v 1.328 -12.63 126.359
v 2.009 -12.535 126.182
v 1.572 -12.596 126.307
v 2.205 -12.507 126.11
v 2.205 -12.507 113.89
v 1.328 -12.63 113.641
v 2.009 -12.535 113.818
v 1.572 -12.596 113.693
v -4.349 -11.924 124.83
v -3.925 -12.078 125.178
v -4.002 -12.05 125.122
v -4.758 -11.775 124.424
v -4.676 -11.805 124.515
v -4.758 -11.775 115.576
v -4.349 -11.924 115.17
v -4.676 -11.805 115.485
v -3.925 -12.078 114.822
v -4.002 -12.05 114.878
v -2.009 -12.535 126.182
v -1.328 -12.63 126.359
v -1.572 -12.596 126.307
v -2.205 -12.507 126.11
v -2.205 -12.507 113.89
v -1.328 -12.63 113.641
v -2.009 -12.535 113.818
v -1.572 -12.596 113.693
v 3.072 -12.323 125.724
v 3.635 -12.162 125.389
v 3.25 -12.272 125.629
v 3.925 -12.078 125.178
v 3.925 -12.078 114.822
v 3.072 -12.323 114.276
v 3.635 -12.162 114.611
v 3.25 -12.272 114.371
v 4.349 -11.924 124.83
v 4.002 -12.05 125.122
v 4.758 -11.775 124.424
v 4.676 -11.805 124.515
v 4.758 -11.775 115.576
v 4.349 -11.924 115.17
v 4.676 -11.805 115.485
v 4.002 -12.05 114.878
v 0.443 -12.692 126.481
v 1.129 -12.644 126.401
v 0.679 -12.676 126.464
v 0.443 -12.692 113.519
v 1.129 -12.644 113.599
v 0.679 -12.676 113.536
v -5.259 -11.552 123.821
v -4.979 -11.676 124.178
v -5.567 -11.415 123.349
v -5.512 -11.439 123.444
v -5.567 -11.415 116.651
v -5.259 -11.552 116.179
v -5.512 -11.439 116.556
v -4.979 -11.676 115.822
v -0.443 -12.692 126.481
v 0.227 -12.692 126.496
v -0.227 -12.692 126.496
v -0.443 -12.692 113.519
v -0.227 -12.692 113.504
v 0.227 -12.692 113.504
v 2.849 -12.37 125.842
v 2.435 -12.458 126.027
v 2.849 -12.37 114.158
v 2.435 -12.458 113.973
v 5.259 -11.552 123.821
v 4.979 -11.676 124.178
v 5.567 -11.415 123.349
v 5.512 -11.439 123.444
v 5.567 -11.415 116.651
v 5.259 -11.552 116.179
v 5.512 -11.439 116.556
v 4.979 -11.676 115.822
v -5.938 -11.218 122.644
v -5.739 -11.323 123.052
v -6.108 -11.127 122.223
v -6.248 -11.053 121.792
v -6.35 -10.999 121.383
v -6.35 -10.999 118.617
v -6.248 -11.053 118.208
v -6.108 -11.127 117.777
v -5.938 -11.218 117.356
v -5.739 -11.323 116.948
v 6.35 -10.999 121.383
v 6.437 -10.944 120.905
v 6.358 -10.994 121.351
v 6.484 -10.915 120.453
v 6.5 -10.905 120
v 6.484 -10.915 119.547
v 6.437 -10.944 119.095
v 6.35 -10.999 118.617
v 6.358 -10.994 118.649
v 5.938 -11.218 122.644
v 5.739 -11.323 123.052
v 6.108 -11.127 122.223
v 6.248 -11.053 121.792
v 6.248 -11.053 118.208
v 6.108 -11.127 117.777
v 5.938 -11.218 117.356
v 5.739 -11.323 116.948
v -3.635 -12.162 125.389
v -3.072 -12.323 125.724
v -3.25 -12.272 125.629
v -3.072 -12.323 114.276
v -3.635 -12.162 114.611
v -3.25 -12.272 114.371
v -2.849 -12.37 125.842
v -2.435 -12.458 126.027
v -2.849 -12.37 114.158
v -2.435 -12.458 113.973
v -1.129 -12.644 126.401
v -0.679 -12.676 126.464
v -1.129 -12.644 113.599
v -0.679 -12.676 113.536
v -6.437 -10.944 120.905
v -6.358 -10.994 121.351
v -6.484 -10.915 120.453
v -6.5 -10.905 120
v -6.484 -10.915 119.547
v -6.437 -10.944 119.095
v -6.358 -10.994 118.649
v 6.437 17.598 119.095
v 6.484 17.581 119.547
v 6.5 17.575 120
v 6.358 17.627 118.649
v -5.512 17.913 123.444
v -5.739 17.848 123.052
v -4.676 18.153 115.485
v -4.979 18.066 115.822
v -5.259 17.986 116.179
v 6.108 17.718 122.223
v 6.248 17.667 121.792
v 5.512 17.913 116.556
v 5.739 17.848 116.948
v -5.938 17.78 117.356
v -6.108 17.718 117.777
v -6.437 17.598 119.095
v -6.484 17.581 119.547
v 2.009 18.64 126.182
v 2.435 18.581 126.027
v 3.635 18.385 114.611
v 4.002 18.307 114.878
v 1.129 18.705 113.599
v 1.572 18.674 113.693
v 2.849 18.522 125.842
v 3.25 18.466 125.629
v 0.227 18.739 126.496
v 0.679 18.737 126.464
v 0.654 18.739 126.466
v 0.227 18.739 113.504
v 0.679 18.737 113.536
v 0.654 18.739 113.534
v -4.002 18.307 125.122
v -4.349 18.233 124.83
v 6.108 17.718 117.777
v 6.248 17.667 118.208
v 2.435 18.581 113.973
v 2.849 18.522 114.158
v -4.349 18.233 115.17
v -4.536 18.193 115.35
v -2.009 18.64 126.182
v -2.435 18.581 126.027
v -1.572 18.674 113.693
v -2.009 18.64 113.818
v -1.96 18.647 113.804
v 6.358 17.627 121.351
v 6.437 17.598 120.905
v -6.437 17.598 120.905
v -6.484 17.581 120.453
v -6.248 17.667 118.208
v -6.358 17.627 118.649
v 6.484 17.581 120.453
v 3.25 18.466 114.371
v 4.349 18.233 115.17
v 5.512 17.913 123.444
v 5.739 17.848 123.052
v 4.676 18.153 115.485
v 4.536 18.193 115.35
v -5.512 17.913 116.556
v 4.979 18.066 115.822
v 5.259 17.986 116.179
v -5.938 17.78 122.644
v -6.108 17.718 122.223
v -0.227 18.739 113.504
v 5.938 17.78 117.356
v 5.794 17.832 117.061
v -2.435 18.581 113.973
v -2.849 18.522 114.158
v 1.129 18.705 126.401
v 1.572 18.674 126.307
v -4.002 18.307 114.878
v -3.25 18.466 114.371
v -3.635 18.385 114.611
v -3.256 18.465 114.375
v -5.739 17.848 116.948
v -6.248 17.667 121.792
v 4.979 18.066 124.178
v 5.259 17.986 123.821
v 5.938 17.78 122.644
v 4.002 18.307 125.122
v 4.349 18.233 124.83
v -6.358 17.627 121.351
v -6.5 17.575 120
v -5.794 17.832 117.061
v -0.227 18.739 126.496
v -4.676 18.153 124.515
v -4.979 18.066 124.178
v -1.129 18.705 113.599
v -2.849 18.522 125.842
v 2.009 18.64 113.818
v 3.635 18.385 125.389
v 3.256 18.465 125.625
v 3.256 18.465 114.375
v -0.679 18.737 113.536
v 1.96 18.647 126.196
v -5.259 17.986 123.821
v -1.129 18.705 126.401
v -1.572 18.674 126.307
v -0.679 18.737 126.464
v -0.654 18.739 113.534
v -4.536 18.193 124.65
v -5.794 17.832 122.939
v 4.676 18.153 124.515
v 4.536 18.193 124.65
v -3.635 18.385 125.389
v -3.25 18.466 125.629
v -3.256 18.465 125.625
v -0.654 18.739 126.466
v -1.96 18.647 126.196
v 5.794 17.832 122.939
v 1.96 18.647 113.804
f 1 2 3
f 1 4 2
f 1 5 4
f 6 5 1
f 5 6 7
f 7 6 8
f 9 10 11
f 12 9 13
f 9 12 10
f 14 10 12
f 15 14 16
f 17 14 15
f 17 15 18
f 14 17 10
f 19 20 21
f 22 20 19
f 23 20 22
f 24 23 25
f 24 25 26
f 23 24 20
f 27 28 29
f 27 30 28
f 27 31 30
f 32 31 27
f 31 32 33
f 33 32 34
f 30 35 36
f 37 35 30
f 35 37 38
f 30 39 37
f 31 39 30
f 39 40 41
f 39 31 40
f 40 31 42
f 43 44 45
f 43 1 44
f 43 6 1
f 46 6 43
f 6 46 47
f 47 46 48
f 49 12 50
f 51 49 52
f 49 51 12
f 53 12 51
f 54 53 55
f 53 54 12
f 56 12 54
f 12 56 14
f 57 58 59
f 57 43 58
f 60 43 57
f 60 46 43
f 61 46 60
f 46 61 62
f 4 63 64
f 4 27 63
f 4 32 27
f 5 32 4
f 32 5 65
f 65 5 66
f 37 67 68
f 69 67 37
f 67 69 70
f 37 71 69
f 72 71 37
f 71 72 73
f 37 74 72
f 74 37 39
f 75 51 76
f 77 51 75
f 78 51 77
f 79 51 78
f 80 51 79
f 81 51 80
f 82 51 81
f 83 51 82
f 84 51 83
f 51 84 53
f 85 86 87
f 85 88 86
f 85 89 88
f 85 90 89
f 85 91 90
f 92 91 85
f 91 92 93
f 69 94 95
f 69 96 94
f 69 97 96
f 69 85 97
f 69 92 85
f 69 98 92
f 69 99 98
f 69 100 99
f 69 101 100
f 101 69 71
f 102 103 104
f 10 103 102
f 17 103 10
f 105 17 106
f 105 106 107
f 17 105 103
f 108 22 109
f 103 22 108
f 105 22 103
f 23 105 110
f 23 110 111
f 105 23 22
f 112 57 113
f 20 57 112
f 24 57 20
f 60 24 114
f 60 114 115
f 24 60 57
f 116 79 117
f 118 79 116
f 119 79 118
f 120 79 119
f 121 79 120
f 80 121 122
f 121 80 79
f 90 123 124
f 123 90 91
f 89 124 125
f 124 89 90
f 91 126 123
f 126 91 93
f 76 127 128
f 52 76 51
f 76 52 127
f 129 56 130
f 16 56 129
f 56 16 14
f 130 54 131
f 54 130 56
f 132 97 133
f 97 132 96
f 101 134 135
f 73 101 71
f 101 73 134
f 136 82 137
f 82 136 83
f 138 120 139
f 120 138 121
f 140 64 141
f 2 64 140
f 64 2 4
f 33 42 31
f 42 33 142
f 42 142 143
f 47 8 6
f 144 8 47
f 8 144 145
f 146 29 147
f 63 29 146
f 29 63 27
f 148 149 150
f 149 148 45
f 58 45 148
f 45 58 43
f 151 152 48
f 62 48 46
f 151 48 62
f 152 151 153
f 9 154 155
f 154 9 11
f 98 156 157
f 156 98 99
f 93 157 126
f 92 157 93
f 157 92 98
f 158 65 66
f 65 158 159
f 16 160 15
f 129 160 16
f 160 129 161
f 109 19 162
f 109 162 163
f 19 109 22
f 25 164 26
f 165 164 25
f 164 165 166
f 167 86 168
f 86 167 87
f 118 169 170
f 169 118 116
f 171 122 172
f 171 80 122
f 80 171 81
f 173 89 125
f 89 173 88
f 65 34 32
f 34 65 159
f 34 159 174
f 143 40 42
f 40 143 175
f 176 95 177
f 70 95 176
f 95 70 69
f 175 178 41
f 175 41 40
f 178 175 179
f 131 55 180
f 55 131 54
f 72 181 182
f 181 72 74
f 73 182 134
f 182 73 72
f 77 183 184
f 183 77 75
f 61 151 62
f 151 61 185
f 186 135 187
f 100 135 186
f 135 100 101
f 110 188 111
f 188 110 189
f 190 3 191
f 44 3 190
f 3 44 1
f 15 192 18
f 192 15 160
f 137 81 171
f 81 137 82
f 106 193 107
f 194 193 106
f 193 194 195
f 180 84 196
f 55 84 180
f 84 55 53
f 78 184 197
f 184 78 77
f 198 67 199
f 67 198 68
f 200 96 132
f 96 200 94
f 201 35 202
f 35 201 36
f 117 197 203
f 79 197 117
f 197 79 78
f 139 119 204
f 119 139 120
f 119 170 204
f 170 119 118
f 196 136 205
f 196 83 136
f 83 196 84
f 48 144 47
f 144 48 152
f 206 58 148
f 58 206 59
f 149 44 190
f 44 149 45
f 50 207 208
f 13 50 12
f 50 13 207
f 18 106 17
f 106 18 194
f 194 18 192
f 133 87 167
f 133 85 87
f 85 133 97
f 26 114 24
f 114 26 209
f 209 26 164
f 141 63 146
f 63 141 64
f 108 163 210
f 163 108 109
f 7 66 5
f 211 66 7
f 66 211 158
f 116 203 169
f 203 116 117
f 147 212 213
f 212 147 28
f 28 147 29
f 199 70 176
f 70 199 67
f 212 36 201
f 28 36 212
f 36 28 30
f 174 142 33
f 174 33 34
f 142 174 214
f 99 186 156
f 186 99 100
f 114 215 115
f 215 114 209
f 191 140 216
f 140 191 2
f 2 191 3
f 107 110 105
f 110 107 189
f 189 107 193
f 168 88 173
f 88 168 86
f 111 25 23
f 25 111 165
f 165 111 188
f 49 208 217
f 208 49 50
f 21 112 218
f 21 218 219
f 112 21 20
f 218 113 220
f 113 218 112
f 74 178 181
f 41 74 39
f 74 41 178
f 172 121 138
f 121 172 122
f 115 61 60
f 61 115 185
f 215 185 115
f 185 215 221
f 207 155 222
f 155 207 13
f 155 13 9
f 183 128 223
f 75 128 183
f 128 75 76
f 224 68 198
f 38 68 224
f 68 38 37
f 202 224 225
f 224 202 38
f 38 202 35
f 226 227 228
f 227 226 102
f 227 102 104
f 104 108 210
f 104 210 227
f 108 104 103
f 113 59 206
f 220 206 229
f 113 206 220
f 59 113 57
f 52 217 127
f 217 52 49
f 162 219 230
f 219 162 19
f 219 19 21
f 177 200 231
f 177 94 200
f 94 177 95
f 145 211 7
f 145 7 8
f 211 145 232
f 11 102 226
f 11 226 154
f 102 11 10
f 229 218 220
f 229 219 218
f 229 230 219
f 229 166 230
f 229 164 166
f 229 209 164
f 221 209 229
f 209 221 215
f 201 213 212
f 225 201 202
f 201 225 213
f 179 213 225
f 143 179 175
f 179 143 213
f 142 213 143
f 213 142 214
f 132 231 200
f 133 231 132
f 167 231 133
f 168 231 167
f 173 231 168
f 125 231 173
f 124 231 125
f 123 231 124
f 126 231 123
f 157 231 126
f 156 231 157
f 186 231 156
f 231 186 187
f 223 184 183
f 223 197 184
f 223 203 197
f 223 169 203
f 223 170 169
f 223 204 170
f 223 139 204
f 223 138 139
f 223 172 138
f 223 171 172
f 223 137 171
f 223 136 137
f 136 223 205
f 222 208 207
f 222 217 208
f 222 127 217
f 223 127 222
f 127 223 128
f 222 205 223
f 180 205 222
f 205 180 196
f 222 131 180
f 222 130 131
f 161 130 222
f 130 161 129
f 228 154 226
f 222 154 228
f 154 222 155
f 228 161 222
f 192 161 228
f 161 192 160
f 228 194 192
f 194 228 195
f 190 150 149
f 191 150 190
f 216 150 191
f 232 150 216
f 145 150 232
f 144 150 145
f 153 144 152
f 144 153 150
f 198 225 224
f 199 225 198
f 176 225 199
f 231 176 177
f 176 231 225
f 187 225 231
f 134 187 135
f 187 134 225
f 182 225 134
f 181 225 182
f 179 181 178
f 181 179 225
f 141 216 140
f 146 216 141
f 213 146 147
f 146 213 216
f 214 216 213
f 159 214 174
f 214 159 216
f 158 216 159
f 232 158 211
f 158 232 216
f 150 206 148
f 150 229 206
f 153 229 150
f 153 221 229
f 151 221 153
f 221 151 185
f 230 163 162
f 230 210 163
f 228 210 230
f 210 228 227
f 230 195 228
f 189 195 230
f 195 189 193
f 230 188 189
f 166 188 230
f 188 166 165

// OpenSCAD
// file: dim.scad
TANO_VERSION		= 2;

M_TRANSITION		= 101;
M_LED_HOLDER_FRONT	= M_TRANSITION + 62;
M_LED_HOLDER_BACK	= M_LED_HOLDER_FRONT - 10;
M_SWITCH_CENTER		= M_TRANSITION + 45;
M_DOTSTAR			= M_TRANSITION + 33;	// FIXME center mark of first dotstar
M_PORT_CENTER       = M_TRANSITION + 14;

M_POMMEL_BACK		= -12.5;	// Back of the pommel
M_0					= 0;
M_POMMEL_FRONT		= 10;		// Where the pommel becomes aft
M_RAIL_START		= 12;
M_SPKR_RING			= 15.5;		// Front of the speaker ring.

H_BUTTRESS			= 4;

M_BUTTRESS_0		= M_SPKR_RING;			// speaker holder, behind wings
M_BUTTRESS_1		= M_SPKR_RING + 18;
M_BUTTRESS_2		= M_SPKR_RING + 37;
M_BUTTRESS_3		= M_BUTTRESS_0 + H_BUTTRESS + 55;
M_BUTTRESS_4		= M_SPKR_RING + 70;		// holds speaker in place, space for foam

M_WAY_BACK			= -20;
H_FAR				= 200;

MM_TO_INCHES = 1 / 25.4;
INCHES_TO_MM = 25.4;

D_FORWARD			= 25.4;
R_FORWARD 			= D_FORWARD / 2;
D_AFT				= 32.5;
R_AFT 				= D_AFT / 2;
T_TRANSITION_RING	= 4;

Y_SWITCH			= 9.6;
D_SWITCH			= 12.5;
D_SWITCH_TOP		= 14.5;
D_PORT 				= 12.7;		// FIXME
D_SMALL_PORT		= 7.9;

D_SABER_OUTER		= 37.5;

X_DOTSTAR           = 5.0;  // from spec
Y_DOTSTAR           = 1.4;  // from spec
DOTSTAR_SPACE		= 7;

H_BATTERY           = 68;
D_BATTERY           = 18.50 + 0.5;    // An 1850. Huh. 
R_BATTERY			= D_BATTERY / 2;

H_SPKR_METAL   		= 8 + 0.5;
D_SPKR_METAL   		= 23.6;	
H_SPKR_PLASTIC 		= 2.7;
D_SPKR_PLASTIC 		= 28;
D_POMMEL			= 31.0; // 31.5 is correct, but snug
R_POMMEL 			= D_POMMEL / 2;
D_AFT_RING			= 33.5;

RAIL_ANGLE_0		=  25; //38;
RAIL_ANGLE_1		= -18; //-38;
RAIL_ANGLE_2		=  180 - RAIL_ANGLE_0;
RAIL_ANGLE_3		= -180 - RAIL_ANGLE_1;

X_RAIL				= 3;
Y_RAIL				= 4;

W_WING  			= 25;
H_WING  			= 10.5;	// higher over power converter

W_MC 				= 18;
H_MC    			= 10;
Y_MC    			= -13.5;
Z_MC_35 			= 71.2;		// includes SD

// Battery
// 68mm
//   - 4 front holder
//   - 4 rear holder
//   - 2 slop
// 58mm, 2.28in
// main file
include <dim.scad>

$fn = 90;

H = 50;
D = 13;

module innerTube()
{
    translate([0, 0, M_WAY_BACK]) {
        cylinder(d=D_AFT, h=M_TRANSITION - M_WAY_BACK);
    }
    translate([0, 0, M_TRANSITION]) {
        cylinder(d=D_FORWARD, h = H_FAR);
    }
}

intersection() {
    innerTube();
    translate([0, -20, 120]) rotate([-90, 0, 0]) cylinder(h=H, d=D);
}

intersection() {
    cylinder(h=200, d=D_SABER_OUTER);
    translate([0, 0, 120]) rotate([-90, 0, 0]) cylinder(h=H, d=D);
}
